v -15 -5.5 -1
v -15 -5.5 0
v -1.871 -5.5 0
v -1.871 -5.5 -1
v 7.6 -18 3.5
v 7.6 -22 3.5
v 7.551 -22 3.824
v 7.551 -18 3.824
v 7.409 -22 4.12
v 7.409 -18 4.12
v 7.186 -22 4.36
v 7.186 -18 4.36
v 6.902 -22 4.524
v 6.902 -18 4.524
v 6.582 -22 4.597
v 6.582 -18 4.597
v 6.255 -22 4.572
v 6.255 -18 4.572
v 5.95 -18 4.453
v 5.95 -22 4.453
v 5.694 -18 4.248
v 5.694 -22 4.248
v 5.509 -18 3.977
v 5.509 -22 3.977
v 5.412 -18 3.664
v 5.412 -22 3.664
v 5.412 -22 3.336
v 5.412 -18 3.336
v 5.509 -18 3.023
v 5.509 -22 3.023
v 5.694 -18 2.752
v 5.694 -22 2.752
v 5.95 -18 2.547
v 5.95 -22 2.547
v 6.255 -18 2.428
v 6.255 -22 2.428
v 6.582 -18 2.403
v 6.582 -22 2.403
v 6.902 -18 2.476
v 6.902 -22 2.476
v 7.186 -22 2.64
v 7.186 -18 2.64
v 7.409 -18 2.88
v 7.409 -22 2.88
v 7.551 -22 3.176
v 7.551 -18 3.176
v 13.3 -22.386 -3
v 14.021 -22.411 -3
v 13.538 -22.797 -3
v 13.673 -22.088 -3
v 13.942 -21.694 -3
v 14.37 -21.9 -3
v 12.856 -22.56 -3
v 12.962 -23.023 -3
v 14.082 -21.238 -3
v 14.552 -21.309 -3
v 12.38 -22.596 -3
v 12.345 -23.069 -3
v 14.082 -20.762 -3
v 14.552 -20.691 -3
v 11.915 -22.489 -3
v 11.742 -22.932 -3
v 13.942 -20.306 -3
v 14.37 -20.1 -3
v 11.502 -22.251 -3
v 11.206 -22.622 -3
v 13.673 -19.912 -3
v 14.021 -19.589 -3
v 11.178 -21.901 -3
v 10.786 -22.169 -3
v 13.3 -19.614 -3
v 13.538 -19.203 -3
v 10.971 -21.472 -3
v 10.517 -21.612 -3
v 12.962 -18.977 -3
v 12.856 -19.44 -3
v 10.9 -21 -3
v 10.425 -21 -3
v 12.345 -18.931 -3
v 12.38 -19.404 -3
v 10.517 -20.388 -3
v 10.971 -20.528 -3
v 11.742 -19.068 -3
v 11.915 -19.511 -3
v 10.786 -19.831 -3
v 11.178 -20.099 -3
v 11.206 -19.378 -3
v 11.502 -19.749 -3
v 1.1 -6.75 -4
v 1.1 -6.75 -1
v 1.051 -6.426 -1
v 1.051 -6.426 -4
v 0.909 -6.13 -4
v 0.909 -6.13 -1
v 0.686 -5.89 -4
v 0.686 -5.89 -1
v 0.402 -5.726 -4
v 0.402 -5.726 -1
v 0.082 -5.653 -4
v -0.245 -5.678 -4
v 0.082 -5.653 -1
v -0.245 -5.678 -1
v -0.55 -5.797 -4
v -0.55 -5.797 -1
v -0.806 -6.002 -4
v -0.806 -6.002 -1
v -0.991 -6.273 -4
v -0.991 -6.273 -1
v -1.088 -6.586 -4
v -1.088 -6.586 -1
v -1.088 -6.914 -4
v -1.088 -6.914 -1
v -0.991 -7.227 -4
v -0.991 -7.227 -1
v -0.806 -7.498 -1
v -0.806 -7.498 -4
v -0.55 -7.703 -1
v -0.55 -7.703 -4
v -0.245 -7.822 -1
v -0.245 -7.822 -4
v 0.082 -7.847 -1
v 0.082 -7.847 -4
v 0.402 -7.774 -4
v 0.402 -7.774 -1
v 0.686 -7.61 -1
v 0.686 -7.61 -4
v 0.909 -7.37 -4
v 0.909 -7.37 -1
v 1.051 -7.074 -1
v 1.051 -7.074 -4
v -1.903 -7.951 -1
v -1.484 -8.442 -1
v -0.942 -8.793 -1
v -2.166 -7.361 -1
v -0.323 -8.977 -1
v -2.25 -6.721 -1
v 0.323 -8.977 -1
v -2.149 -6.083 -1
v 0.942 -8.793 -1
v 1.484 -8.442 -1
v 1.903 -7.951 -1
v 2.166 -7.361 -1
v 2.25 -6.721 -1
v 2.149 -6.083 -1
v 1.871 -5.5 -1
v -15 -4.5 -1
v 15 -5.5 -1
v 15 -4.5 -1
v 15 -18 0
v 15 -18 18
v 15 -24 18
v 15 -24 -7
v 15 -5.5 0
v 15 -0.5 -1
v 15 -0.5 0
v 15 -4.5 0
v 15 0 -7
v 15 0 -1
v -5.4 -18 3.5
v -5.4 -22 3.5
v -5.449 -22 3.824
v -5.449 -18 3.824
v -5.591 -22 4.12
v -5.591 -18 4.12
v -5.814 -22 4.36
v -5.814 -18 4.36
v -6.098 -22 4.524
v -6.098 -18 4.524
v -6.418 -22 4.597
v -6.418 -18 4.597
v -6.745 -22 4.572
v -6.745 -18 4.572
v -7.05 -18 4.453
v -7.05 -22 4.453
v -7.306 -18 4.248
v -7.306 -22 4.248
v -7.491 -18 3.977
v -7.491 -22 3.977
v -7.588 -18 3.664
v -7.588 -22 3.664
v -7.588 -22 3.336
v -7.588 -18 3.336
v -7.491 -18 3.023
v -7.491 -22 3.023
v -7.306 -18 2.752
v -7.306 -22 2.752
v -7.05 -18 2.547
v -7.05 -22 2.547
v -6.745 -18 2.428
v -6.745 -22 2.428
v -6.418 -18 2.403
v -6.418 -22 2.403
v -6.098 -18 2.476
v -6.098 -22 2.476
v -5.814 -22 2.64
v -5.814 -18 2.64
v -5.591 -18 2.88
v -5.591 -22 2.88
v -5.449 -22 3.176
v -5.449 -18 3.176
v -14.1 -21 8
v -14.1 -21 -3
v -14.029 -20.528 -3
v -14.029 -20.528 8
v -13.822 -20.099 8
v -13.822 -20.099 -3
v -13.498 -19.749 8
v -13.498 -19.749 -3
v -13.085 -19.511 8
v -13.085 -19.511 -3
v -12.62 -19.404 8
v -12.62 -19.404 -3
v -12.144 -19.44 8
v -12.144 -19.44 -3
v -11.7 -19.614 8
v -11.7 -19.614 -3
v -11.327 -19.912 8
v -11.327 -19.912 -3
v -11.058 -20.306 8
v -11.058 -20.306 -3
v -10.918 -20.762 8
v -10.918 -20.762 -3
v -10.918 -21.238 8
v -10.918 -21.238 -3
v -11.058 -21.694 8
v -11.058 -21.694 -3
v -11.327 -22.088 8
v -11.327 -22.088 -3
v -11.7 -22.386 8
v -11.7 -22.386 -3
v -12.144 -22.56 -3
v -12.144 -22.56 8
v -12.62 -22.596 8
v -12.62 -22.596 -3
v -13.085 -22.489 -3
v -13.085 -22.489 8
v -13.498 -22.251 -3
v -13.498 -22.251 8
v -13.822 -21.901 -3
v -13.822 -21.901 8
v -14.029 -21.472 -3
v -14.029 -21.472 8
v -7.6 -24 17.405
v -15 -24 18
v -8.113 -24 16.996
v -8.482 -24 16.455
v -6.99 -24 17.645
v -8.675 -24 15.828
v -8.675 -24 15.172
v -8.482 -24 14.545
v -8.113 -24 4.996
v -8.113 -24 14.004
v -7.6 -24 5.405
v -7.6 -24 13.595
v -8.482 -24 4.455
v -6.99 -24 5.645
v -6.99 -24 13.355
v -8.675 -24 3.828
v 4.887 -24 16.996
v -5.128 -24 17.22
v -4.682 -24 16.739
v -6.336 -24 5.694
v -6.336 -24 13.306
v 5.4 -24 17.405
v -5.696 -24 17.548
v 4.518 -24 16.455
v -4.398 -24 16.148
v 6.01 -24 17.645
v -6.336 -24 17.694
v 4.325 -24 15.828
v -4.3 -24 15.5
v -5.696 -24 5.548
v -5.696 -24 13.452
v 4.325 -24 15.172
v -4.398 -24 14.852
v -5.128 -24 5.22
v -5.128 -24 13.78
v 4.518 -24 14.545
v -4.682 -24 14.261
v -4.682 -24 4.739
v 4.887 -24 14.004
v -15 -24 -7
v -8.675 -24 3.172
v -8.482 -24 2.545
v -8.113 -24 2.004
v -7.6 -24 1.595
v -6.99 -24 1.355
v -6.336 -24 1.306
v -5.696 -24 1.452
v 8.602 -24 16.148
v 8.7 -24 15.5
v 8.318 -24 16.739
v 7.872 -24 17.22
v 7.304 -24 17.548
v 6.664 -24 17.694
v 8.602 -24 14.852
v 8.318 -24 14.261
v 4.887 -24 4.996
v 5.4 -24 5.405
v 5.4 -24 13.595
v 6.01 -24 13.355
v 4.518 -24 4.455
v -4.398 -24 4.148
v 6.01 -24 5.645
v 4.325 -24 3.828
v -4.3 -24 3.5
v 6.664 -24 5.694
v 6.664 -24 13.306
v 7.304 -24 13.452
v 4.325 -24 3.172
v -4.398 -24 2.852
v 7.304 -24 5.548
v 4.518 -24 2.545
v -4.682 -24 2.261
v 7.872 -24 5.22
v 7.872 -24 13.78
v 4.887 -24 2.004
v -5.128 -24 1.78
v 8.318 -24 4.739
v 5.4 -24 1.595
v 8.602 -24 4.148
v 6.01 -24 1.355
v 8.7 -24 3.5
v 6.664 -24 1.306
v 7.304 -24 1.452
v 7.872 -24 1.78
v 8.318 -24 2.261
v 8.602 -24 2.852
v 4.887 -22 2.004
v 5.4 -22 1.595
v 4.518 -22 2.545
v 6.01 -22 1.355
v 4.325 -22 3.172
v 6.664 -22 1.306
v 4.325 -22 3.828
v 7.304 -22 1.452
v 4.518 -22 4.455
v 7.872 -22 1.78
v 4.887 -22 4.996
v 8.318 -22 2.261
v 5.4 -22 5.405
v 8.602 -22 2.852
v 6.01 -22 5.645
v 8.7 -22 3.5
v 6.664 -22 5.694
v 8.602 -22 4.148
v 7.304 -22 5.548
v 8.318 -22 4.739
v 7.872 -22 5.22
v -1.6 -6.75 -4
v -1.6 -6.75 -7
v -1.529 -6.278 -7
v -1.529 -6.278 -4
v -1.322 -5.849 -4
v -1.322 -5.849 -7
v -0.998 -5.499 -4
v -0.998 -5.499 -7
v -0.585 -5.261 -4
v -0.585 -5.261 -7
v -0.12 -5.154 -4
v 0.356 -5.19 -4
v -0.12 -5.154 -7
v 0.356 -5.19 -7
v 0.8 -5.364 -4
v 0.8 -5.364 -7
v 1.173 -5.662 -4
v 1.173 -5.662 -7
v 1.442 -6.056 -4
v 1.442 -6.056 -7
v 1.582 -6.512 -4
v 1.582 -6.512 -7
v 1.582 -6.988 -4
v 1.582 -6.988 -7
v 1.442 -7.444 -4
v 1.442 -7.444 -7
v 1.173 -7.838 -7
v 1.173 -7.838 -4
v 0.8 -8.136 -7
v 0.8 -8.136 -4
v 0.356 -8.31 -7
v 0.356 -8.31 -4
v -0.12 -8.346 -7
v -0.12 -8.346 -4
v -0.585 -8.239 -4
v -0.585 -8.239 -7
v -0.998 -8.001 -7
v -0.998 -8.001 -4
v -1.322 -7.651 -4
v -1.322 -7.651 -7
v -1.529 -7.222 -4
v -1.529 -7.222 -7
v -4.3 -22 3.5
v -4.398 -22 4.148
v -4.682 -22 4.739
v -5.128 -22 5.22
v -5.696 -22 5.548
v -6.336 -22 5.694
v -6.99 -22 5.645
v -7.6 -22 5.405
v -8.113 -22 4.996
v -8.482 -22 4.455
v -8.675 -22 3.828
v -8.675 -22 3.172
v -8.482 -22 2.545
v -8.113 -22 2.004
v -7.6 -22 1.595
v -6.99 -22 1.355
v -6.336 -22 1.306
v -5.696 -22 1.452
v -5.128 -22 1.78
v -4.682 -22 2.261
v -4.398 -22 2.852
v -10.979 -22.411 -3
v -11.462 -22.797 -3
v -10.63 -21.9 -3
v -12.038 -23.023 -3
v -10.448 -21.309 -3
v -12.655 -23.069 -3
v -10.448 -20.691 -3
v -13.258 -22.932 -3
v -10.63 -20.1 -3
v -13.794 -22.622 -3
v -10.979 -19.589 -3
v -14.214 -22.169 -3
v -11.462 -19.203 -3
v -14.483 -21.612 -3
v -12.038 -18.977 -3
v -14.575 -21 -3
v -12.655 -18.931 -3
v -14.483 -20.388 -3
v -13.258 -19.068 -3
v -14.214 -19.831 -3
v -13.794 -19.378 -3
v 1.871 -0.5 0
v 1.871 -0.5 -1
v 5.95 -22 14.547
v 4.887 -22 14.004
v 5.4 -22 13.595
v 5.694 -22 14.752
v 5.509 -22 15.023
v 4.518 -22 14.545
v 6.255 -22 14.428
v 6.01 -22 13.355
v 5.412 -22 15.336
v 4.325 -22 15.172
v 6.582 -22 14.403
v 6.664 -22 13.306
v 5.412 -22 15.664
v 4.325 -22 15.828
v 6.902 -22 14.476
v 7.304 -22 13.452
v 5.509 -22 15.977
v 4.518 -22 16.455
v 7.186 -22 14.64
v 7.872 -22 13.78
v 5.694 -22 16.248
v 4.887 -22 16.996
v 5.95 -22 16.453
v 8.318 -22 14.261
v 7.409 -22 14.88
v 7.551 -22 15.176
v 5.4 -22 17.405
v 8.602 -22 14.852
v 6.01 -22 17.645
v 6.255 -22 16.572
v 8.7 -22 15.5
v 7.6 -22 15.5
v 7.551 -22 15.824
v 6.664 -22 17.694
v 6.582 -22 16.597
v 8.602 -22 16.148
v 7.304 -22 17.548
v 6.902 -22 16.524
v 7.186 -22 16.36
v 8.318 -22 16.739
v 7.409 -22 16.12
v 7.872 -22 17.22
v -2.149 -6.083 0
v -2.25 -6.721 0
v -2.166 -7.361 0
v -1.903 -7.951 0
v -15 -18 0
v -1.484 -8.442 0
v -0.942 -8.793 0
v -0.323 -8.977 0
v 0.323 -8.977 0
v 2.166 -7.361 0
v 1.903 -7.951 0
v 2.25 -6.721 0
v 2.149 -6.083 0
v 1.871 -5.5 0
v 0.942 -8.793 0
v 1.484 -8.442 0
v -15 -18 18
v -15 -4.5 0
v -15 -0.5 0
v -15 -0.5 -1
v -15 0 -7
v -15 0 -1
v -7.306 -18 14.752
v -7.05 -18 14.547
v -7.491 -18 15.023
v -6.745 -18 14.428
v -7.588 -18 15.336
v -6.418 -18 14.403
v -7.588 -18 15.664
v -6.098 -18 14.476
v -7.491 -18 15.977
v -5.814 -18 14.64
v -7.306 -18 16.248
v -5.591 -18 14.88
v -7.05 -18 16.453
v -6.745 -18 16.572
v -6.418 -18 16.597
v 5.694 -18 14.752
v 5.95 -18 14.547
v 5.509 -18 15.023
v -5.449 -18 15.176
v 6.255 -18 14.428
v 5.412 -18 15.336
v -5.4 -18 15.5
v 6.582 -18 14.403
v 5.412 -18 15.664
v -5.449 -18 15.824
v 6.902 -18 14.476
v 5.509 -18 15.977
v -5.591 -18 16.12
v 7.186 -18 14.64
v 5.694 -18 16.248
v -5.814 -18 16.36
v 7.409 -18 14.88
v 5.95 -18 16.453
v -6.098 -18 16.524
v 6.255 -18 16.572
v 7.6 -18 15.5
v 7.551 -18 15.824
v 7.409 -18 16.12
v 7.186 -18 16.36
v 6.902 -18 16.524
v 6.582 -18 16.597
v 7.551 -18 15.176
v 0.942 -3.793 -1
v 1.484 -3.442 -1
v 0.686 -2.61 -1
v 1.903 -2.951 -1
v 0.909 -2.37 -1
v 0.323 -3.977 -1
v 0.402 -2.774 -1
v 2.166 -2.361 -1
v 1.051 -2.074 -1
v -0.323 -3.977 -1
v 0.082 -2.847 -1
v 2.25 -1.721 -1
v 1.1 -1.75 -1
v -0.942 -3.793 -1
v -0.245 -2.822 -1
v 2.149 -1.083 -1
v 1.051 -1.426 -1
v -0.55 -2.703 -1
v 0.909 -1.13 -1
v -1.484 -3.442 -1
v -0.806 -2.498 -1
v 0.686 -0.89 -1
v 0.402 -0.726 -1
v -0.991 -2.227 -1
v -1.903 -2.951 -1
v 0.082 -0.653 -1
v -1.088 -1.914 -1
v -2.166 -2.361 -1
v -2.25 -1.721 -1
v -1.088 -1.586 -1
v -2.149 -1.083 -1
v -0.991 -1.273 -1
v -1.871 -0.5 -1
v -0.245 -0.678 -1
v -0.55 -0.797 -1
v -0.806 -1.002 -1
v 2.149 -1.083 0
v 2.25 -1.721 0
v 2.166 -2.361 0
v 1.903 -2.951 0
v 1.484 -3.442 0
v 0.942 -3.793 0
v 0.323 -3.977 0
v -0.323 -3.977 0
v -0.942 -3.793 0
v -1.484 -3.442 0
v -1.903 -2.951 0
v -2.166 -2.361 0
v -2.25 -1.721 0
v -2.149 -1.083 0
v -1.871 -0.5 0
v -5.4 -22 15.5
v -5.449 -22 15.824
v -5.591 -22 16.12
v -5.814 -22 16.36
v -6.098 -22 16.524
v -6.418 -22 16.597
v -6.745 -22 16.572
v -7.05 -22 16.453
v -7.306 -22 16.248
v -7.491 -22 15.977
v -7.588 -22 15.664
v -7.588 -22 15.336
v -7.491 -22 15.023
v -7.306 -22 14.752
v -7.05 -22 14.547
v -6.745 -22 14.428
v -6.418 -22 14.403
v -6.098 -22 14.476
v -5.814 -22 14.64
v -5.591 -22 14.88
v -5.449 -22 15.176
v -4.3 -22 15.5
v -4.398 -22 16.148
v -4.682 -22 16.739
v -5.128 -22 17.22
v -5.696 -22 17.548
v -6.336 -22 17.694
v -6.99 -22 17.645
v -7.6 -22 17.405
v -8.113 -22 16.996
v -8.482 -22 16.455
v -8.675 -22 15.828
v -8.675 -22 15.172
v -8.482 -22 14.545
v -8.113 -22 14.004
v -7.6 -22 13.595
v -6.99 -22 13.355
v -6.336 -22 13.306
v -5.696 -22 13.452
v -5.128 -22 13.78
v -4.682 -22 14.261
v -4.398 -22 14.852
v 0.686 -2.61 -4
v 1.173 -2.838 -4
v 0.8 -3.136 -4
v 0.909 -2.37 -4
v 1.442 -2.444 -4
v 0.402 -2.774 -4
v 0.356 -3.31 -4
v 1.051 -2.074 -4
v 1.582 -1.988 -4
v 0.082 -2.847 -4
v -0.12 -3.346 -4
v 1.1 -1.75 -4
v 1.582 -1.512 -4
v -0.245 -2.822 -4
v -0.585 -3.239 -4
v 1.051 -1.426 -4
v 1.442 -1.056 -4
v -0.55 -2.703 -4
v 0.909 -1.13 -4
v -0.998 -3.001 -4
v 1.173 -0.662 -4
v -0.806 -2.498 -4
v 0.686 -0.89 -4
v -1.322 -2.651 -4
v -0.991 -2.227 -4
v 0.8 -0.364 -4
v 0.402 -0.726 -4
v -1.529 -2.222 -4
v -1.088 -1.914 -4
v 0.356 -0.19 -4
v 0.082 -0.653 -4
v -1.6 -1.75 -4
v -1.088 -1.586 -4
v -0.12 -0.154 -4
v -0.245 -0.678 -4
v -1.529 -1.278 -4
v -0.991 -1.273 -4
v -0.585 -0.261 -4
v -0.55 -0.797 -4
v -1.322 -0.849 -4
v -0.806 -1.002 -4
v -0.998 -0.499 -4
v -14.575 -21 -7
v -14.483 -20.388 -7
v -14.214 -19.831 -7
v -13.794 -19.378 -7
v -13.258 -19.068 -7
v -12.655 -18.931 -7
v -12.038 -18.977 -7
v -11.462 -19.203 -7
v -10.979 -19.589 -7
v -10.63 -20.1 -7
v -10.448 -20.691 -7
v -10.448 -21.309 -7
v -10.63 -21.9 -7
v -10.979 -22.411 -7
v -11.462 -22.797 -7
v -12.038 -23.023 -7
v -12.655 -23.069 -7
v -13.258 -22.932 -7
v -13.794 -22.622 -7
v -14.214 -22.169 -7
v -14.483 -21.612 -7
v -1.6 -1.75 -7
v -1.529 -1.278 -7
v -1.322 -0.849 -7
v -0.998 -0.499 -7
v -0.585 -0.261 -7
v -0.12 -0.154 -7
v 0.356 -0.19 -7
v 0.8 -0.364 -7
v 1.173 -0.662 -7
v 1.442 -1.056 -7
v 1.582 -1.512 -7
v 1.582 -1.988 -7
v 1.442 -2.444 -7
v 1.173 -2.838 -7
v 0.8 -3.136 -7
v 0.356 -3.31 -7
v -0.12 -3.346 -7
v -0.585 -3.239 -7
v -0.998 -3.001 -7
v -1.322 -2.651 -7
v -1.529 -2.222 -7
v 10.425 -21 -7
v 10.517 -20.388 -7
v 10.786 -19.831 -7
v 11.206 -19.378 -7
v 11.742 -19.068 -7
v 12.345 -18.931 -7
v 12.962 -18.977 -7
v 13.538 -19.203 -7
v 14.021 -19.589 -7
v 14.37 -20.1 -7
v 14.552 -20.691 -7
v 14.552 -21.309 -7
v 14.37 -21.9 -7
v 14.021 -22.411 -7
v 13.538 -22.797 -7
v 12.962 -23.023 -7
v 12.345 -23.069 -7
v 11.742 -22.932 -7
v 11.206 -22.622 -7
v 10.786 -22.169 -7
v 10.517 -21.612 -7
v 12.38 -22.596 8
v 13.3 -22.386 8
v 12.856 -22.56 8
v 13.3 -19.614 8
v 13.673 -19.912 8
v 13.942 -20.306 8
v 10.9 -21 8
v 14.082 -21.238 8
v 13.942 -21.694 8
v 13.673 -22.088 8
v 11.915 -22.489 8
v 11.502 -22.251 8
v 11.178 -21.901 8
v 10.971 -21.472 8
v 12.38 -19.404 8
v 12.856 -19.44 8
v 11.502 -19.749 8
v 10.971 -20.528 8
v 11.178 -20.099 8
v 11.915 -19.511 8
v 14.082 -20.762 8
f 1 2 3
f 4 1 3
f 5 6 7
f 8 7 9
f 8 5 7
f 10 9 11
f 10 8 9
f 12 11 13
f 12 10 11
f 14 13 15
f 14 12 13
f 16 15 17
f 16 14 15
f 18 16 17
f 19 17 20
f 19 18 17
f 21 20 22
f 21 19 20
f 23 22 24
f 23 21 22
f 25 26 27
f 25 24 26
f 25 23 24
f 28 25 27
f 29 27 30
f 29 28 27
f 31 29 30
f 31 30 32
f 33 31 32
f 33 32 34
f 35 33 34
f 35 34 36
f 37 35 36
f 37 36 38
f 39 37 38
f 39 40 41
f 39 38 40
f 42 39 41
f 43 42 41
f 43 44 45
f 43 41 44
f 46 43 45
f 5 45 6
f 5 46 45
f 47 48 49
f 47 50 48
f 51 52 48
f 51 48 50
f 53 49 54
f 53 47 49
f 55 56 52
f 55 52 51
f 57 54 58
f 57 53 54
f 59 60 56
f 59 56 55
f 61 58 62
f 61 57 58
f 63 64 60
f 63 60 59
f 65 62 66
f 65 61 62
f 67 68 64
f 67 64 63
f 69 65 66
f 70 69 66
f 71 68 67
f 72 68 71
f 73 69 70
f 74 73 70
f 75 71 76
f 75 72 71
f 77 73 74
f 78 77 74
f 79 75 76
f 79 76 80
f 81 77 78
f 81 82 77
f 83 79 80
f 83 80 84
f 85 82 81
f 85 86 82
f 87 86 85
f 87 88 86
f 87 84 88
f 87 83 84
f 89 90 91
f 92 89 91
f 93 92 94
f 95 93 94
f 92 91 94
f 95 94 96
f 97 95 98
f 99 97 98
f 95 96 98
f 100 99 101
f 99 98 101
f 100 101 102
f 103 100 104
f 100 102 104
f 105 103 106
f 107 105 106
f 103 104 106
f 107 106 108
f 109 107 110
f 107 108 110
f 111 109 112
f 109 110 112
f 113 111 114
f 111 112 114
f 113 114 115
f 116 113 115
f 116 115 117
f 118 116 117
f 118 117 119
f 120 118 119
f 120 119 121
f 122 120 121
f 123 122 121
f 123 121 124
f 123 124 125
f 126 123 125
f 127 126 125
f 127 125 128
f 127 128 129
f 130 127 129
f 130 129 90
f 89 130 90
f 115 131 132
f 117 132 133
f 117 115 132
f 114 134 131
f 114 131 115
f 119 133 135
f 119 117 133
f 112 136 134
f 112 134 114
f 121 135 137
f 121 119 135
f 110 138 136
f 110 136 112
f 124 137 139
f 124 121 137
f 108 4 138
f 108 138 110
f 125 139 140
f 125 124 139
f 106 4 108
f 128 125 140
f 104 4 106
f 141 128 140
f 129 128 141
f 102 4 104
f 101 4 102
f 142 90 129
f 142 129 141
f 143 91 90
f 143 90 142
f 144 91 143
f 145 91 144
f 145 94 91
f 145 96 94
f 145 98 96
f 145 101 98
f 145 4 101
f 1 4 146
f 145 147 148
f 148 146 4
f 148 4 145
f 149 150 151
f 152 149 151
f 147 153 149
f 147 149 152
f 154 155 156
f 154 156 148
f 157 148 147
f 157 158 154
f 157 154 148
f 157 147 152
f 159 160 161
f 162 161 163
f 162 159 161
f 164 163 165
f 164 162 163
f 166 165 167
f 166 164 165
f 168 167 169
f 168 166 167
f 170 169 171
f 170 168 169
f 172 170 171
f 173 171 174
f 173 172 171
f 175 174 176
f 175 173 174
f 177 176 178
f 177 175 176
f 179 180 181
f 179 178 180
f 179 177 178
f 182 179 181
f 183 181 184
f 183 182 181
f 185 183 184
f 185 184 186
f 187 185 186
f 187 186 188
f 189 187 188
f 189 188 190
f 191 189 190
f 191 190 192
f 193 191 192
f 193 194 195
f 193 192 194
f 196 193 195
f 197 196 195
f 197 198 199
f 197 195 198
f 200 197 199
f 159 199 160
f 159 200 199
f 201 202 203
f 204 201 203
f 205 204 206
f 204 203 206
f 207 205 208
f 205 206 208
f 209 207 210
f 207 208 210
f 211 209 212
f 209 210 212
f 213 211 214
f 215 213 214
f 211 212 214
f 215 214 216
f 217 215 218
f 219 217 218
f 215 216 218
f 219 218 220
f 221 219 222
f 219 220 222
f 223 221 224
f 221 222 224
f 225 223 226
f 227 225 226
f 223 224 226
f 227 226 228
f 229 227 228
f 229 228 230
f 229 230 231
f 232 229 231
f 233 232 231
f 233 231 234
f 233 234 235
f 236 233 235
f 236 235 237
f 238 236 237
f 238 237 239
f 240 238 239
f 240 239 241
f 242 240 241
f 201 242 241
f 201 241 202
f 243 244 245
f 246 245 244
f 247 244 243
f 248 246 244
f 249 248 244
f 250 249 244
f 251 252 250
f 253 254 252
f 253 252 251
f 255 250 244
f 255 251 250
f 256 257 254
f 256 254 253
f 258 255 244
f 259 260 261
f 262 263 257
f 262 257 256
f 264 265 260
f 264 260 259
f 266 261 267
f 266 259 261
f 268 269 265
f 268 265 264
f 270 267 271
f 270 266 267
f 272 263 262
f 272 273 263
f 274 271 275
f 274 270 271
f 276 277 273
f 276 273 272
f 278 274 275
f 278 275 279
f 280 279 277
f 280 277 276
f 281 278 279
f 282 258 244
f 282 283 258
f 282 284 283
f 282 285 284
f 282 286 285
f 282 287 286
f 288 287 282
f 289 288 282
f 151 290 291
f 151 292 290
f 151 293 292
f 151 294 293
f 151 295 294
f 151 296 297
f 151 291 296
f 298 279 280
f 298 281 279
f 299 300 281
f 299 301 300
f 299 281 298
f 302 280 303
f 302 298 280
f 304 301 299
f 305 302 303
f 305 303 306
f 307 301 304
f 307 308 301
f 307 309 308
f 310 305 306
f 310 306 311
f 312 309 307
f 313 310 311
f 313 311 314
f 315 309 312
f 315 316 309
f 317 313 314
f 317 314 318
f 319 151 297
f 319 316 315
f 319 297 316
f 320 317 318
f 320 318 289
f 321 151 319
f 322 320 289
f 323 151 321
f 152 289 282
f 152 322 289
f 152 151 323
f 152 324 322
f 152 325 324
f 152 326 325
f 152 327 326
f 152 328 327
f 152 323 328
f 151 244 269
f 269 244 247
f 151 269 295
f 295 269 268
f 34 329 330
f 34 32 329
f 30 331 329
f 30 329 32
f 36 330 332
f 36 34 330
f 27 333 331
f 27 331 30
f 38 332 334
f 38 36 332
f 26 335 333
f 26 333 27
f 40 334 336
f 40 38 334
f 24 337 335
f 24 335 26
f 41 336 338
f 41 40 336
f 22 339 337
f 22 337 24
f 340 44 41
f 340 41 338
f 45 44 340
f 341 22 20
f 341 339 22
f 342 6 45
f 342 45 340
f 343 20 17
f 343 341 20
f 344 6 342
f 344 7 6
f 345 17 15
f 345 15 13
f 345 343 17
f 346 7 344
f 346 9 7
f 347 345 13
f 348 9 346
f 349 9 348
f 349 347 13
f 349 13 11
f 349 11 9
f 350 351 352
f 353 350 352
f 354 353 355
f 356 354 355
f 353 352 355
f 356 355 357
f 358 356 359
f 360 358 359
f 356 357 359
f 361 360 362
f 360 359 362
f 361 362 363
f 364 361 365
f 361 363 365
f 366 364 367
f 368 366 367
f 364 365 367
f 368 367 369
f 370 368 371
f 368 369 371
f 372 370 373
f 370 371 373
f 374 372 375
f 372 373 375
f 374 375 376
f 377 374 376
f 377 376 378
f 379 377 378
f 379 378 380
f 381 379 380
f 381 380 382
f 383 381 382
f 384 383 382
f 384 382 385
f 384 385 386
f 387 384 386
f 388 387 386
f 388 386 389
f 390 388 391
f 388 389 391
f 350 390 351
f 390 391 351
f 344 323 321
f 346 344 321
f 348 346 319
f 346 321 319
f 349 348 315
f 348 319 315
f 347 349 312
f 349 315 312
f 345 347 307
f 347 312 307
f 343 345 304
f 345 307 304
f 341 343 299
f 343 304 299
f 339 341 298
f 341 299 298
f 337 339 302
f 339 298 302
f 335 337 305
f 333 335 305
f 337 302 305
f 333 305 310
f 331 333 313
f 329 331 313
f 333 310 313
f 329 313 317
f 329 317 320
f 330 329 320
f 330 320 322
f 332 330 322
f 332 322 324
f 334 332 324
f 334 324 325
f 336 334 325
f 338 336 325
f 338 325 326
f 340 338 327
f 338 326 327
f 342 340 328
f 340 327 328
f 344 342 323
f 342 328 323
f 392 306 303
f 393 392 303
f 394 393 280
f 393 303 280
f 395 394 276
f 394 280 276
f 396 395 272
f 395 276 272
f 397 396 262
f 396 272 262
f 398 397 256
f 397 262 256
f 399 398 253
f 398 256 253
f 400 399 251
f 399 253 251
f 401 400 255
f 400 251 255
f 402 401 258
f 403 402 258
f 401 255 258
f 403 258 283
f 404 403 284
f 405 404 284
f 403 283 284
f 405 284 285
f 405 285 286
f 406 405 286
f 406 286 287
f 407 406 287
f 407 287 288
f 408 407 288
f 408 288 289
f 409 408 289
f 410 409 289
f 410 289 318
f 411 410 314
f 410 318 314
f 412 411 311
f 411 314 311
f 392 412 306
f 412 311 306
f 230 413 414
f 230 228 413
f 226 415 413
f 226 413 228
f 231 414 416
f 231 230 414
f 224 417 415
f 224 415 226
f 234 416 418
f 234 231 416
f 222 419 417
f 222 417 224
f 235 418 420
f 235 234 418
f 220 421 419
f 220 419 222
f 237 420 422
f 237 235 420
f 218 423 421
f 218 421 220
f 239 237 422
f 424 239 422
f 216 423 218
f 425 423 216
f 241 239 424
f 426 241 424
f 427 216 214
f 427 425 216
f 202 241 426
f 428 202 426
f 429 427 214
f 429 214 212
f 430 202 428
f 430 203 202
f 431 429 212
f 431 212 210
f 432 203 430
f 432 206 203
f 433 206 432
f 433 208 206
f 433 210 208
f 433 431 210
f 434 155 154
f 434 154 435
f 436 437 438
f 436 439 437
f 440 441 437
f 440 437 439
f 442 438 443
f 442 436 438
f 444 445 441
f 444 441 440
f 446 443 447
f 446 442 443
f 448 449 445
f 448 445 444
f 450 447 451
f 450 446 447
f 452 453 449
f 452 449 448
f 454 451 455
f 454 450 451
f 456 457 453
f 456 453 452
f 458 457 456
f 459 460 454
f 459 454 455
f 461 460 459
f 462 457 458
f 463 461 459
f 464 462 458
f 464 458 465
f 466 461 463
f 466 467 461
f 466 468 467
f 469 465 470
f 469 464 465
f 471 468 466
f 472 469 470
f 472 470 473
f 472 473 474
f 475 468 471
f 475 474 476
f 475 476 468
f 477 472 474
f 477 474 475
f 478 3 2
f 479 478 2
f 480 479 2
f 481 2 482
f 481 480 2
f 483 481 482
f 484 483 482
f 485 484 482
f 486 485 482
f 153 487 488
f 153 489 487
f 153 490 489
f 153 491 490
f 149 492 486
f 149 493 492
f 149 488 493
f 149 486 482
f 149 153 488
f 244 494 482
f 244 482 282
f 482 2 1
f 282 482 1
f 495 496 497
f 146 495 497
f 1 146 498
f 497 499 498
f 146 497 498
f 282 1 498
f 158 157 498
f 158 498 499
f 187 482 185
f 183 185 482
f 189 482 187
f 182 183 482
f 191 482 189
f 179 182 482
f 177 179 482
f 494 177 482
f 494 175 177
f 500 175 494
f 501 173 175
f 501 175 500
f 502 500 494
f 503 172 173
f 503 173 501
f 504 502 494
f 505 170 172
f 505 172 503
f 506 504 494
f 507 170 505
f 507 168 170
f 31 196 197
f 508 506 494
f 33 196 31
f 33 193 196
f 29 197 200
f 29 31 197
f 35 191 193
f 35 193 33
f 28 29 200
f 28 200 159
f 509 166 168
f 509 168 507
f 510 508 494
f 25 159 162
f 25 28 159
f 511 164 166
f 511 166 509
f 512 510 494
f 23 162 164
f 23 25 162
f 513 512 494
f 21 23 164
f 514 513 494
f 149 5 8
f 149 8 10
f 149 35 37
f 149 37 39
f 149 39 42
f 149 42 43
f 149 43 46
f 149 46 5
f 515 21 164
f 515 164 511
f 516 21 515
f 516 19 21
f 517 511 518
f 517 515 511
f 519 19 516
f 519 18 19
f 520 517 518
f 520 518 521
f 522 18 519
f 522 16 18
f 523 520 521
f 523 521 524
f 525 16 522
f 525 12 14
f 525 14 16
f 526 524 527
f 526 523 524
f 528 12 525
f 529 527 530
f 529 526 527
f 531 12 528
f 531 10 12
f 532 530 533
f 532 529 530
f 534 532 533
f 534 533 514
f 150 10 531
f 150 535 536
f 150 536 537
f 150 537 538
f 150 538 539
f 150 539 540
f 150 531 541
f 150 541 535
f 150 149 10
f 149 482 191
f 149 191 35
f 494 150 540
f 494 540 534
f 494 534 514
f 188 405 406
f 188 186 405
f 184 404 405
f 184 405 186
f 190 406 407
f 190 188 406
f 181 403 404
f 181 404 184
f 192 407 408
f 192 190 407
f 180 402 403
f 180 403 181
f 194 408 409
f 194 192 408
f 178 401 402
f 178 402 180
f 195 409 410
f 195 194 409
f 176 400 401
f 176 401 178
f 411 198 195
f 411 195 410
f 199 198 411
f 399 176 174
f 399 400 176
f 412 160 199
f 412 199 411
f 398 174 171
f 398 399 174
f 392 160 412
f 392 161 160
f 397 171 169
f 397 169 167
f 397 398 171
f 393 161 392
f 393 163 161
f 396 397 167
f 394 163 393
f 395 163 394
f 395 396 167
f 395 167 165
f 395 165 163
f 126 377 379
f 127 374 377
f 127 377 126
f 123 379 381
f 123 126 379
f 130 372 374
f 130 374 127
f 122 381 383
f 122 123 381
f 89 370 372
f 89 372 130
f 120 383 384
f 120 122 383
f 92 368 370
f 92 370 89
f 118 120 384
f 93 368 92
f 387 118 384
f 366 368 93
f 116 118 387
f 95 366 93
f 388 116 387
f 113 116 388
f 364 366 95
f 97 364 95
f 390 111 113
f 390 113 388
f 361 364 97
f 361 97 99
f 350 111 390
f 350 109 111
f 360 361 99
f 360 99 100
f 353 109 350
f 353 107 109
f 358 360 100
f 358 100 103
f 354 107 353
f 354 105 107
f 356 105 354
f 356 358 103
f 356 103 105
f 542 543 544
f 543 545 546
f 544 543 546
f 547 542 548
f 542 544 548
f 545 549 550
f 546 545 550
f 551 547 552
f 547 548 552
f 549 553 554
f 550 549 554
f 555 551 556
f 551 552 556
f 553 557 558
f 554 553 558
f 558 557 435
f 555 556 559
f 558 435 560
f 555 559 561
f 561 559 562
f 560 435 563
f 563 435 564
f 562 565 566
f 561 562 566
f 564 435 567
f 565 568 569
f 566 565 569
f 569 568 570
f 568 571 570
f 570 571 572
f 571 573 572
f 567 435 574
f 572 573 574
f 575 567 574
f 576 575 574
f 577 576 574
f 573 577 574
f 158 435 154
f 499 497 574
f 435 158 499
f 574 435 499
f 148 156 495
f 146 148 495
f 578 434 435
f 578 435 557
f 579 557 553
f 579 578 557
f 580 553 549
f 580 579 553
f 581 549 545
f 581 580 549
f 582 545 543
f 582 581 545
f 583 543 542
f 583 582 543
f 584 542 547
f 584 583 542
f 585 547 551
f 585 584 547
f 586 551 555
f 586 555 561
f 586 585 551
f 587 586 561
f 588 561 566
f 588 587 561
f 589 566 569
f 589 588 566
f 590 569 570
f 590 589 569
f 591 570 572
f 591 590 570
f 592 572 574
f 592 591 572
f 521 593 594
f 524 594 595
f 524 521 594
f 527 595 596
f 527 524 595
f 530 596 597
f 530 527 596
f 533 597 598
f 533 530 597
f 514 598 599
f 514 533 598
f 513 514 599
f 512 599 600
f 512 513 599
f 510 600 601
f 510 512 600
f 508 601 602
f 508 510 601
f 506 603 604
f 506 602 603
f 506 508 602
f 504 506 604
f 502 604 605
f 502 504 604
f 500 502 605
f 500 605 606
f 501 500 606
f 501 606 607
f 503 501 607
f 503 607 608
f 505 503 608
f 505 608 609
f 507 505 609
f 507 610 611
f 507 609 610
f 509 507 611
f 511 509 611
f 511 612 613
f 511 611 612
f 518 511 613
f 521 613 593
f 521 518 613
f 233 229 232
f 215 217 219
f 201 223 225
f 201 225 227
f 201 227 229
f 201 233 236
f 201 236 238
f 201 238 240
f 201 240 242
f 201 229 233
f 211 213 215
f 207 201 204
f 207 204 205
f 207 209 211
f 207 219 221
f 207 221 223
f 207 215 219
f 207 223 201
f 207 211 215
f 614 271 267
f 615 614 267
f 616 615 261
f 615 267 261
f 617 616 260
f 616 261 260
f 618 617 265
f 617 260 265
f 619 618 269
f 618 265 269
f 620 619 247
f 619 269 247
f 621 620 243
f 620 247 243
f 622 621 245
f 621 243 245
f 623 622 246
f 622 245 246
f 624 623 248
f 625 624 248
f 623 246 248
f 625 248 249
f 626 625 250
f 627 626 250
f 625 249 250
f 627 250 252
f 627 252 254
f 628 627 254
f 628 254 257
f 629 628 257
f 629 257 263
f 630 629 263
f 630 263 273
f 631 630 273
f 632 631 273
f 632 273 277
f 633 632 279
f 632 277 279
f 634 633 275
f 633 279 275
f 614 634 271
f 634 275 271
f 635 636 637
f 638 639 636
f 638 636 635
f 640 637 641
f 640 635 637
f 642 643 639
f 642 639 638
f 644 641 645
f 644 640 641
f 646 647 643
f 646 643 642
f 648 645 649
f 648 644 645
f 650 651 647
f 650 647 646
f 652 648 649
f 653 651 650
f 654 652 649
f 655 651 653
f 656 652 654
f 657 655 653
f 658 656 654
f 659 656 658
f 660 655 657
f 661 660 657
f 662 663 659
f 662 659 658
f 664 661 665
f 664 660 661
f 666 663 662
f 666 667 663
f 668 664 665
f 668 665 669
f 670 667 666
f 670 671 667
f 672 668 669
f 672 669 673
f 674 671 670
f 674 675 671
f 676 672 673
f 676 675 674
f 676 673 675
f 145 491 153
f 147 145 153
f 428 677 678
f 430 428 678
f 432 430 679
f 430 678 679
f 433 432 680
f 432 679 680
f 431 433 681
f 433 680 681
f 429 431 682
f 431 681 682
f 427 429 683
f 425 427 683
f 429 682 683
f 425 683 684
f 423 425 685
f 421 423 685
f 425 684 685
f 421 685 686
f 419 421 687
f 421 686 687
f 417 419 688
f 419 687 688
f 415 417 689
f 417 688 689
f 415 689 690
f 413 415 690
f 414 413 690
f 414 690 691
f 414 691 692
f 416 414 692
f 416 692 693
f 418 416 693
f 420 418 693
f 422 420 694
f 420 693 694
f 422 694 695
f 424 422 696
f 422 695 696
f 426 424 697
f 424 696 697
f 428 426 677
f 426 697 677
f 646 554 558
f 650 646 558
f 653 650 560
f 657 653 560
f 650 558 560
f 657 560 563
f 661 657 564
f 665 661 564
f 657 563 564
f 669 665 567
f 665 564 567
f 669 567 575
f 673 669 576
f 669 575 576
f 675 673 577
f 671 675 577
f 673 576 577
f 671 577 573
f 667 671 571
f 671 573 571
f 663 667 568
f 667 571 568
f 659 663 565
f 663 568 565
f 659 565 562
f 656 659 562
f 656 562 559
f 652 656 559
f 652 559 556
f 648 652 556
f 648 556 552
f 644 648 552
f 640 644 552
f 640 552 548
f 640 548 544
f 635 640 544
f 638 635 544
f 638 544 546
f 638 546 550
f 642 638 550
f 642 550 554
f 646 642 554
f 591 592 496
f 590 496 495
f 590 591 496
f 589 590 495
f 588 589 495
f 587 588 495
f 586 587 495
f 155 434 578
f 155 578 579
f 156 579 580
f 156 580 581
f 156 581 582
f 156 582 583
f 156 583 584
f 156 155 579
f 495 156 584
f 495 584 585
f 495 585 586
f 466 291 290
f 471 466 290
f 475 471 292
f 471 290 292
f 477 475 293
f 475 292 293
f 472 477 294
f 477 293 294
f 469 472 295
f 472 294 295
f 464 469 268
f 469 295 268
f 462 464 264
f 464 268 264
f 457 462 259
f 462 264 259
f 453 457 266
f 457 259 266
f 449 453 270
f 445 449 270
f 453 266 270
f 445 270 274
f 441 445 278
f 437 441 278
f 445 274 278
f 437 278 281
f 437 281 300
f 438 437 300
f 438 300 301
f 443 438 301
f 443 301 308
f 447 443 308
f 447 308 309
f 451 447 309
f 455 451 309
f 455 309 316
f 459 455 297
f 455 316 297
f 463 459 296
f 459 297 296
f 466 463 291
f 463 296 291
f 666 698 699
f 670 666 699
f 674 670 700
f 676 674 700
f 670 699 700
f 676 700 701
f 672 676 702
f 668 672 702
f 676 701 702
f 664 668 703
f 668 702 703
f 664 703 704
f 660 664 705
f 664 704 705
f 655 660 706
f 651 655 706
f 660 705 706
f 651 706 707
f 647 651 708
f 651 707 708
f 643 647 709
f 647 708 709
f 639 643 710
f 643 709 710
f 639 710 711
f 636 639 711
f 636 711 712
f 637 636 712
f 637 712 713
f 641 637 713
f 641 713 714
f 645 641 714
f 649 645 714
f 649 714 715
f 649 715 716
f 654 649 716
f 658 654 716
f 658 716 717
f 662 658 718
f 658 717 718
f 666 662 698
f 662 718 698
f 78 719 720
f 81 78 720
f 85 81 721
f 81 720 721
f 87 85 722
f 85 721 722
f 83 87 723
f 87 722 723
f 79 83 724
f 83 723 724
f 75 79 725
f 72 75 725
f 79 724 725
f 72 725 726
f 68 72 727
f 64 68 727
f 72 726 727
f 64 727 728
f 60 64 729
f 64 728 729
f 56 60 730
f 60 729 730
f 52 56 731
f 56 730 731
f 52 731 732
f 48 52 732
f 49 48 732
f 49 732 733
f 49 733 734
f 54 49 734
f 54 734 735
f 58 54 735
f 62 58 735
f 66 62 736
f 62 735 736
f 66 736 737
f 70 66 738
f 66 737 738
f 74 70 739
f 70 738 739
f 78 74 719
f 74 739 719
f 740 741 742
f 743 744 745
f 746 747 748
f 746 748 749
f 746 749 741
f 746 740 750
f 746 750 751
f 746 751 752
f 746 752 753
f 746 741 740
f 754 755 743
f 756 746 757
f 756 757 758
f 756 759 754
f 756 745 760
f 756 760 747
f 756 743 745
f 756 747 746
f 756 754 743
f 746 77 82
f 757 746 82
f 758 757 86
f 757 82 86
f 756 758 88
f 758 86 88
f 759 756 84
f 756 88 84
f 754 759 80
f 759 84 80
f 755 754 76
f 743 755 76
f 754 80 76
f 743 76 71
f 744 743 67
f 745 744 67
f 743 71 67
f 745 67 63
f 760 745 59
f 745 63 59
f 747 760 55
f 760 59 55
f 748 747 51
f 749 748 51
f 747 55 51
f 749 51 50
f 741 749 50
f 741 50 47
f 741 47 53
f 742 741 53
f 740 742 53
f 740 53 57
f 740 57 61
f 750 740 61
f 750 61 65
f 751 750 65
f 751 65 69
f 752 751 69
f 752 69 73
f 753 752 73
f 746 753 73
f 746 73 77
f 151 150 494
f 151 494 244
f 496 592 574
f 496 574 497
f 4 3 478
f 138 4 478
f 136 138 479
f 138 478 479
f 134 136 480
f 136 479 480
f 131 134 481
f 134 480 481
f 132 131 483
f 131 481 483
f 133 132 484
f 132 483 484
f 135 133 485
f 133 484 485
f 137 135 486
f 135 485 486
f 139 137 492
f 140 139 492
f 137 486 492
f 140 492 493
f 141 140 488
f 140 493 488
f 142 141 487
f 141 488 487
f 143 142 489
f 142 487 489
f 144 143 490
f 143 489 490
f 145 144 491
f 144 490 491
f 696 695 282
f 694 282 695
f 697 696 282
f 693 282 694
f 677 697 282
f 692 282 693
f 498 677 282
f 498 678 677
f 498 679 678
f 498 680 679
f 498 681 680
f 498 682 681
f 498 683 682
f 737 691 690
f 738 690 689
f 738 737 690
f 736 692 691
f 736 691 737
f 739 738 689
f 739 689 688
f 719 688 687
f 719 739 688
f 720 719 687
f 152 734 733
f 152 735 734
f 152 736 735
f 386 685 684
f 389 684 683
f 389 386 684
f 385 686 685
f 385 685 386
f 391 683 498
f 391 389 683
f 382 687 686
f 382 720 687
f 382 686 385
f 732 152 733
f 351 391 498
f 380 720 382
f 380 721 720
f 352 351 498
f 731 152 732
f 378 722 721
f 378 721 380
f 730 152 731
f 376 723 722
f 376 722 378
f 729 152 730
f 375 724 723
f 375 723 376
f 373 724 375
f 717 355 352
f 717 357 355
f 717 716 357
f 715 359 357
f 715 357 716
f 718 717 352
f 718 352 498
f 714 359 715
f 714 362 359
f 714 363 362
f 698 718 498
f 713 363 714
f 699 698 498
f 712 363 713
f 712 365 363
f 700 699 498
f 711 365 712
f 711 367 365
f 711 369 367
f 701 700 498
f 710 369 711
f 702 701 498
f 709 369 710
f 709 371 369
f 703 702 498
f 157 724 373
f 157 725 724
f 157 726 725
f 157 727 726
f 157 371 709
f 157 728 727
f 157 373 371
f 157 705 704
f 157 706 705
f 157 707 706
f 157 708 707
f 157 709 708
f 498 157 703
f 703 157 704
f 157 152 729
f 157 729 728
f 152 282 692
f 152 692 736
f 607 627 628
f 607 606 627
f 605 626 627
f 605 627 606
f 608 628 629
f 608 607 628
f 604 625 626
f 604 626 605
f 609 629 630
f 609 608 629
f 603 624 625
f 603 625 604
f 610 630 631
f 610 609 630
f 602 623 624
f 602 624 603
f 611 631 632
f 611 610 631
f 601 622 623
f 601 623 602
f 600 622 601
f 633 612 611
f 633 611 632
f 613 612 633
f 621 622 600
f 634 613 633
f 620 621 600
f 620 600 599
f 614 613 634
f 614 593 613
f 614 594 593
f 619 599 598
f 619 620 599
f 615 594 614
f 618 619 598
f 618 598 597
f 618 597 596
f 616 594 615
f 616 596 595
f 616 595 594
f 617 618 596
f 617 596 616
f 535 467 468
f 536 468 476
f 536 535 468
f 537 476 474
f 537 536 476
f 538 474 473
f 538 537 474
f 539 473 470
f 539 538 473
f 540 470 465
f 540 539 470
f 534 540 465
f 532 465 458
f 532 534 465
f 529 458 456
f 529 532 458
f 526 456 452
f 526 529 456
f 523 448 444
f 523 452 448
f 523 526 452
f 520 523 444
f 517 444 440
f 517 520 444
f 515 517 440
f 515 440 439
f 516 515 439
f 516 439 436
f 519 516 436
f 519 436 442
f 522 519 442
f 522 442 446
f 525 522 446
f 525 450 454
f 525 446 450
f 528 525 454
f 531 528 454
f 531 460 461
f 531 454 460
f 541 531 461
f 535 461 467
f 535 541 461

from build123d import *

# Parameters (mm, degrees)
RESSALTO_EXTRUS_O1_DEPTH = 15
ESBO_O3_R                = 1.1
CORTE_EXTRUS_O1_DEPTH    = 30
CORTE_EXTRUS_O8_DEPTH    = 1
ESBO_O16_R               = 1.1
CORTE_EXTRUS_O9_DEPTH    = 7
ESBO_O17_R               = 1.6
CORTE_EXTRUS_O10_DEPTH   = 3
ESBO_O18_R               = 1.6
CORTE_EXTRUS_O11_DEPTH   = 15
ESBO_O19_R               = 2.075
CORTE_EXTRUS_O12_DEPTH   = 4
ESBO_O20_R               = 2.2
CORTE_EXTRUS_O13_DEPTH   = 2


with BuildPart() as part:
    # Esboço1 → Ressalto-extrusão1 (new body, symmetric)
    with BuildSketch(Plane(origin=(0, 0, 0), x_dir=(0, 0, -1), z_dir=(1, 0, 0))):
        Polygon((0, 0), (0, -18), (-18, -18), (-18, -24), (7, -24), (7, 0), align=None)
    extrude(amount=RESSALTO_EXTRUS_O1_DEPTH, both=True)

    # Esboço3 → Corte-extrusão1 (cut)
    with BuildSketch(Plane.XZ.offset(18)):
        with Locations((-6.5, 15.5)):
            Circle(ESBO_O3_R)
        with Locations((6.5, 15.5)):
            Circle(ESBO_O3_R)
        with Locations((6.5, 3.5)):
            Circle(ESBO_O3_R)
        with Locations((-6.5, 3.5)):
            Circle(ESBO_O3_R)
    extrude(amount=CORTE_EXTRUS_O1_DEPTH, mode=Mode.SUBTRACT)

    # Esboço15 → Corte-extrusão8 (cut)
    with BuildSketch(Plane.XY):
        with BuildLine():
            Line((-1.870828693, -4.5), (-15, -4.5))
            Line((-15, -4.5), (-15, -5.5))
            Line((-15, -5.5), (-1.870828693, -5.5))
            ThreePointArc((-1.870828693, -5.5), (0, -9), (1.870828693, -5.5))
            Line((1.870828693, -5.5), (15, -5.5))
            Line((15, -5.5), (15, -4.5))
            Line((15, -4.5), (1.870828693, -4.5))
            Line((1.870828693, -4.5), (-1.870828693, -4.5))
        make_face()
        with BuildLine():
            Line((15, -0.5), (1.870828693, -0.5))
            ThreePointArc((1.870828693, -0.5), (0, -4), (-1.870828693, -0.5))
            Line((-1.870828693, -0.5), (-15, -0.5))
            Line((-15, -0.5), (-15, 0.5))
            Line((-15, 0.5), (-1.870828693, 0.5))
            Line((-1.870828693, 0.5), (1.870828693, 0.5))
            Line((1.870828693, 0.5), (15, 0.5))
            Line((15, 0.5), (15, -0.5))
        make_face()
    extrude(amount=-CORTE_EXTRUS_O8_DEPTH, mode=Mode.SUBTRACT)

    # Esboço16 → Corte-extrusão9 (cut)
    with BuildSketch(Plane.XY):
        with Locations((0, -1.75)):
            Circle(ESBO_O16_R)
        with Locations((0, -6.75)):
            Circle(ESBO_O16_R)
    extrude(amount=-CORTE_EXTRUS_O9_DEPTH, mode=Mode.SUBTRACT)

    # Esboço17 → Corte-extrusão10 (cut)
    with BuildSketch(Plane(origin=(0, 0, -7), x_dir=(-1, 0, 0), z_dir=(0, 0, -1))):
        with Locations((0, -1.75)):
            Circle(ESBO_O17_R)
        with Locations((0, -6.75)):
            Circle(ESBO_O17_R)
    extrude(amount=-CORTE_EXTRUS_O10_DEPTH, mode=Mode.SUBTRACT)

    # Esboço18 → Corte-extrusão11 (cut)
    with BuildSketch(Plane(origin=(0, 0, -7), x_dir=(-1, 0, 0), z_dir=(0, 0, -1))):
        with Locations((12.5, -21)):
            Circle(ESBO_O18_R)
        with Locations((-12.5, -21)):
            Circle(ESBO_O18_R)
    extrude(amount=-CORTE_EXTRUS_O11_DEPTH, mode=Mode.SUBTRACT)

    # Esboço19 → Corte-extrusão12 (cut)
    with BuildSketch(Plane(origin=(0, 0, -7), x_dir=(-1, 0, 0), z_dir=(0, 0, -1))):
        with Locations((12.5, -21)):
            Circle(ESBO_O19_R)
        with Locations((-12.5, -21)):
            Circle(ESBO_O19_R)
    extrude(amount=-CORTE_EXTRUS_O12_DEPTH, mode=Mode.SUBTRACT)

    # Esboço20 → Corte-extrusão13 (cut)
    with BuildSketch(Plane.XZ.offset(24)):
        with Locations((-6.5, 15.5)):
            Circle(ESBO_O20_R)
        with Locations((6.5, 15.5)):
            Circle(ESBO_O20_R)
        with Locations((6.5, 3.5)):
            Circle(ESBO_O20_R)
        with Locations((-6.5, 3.5)):
            Circle(ESBO_O20_R)
    extrude(amount=-CORTE_EXTRUS_O13_DEPTH, mode=Mode.SUBTRACT)


solid = part.part
